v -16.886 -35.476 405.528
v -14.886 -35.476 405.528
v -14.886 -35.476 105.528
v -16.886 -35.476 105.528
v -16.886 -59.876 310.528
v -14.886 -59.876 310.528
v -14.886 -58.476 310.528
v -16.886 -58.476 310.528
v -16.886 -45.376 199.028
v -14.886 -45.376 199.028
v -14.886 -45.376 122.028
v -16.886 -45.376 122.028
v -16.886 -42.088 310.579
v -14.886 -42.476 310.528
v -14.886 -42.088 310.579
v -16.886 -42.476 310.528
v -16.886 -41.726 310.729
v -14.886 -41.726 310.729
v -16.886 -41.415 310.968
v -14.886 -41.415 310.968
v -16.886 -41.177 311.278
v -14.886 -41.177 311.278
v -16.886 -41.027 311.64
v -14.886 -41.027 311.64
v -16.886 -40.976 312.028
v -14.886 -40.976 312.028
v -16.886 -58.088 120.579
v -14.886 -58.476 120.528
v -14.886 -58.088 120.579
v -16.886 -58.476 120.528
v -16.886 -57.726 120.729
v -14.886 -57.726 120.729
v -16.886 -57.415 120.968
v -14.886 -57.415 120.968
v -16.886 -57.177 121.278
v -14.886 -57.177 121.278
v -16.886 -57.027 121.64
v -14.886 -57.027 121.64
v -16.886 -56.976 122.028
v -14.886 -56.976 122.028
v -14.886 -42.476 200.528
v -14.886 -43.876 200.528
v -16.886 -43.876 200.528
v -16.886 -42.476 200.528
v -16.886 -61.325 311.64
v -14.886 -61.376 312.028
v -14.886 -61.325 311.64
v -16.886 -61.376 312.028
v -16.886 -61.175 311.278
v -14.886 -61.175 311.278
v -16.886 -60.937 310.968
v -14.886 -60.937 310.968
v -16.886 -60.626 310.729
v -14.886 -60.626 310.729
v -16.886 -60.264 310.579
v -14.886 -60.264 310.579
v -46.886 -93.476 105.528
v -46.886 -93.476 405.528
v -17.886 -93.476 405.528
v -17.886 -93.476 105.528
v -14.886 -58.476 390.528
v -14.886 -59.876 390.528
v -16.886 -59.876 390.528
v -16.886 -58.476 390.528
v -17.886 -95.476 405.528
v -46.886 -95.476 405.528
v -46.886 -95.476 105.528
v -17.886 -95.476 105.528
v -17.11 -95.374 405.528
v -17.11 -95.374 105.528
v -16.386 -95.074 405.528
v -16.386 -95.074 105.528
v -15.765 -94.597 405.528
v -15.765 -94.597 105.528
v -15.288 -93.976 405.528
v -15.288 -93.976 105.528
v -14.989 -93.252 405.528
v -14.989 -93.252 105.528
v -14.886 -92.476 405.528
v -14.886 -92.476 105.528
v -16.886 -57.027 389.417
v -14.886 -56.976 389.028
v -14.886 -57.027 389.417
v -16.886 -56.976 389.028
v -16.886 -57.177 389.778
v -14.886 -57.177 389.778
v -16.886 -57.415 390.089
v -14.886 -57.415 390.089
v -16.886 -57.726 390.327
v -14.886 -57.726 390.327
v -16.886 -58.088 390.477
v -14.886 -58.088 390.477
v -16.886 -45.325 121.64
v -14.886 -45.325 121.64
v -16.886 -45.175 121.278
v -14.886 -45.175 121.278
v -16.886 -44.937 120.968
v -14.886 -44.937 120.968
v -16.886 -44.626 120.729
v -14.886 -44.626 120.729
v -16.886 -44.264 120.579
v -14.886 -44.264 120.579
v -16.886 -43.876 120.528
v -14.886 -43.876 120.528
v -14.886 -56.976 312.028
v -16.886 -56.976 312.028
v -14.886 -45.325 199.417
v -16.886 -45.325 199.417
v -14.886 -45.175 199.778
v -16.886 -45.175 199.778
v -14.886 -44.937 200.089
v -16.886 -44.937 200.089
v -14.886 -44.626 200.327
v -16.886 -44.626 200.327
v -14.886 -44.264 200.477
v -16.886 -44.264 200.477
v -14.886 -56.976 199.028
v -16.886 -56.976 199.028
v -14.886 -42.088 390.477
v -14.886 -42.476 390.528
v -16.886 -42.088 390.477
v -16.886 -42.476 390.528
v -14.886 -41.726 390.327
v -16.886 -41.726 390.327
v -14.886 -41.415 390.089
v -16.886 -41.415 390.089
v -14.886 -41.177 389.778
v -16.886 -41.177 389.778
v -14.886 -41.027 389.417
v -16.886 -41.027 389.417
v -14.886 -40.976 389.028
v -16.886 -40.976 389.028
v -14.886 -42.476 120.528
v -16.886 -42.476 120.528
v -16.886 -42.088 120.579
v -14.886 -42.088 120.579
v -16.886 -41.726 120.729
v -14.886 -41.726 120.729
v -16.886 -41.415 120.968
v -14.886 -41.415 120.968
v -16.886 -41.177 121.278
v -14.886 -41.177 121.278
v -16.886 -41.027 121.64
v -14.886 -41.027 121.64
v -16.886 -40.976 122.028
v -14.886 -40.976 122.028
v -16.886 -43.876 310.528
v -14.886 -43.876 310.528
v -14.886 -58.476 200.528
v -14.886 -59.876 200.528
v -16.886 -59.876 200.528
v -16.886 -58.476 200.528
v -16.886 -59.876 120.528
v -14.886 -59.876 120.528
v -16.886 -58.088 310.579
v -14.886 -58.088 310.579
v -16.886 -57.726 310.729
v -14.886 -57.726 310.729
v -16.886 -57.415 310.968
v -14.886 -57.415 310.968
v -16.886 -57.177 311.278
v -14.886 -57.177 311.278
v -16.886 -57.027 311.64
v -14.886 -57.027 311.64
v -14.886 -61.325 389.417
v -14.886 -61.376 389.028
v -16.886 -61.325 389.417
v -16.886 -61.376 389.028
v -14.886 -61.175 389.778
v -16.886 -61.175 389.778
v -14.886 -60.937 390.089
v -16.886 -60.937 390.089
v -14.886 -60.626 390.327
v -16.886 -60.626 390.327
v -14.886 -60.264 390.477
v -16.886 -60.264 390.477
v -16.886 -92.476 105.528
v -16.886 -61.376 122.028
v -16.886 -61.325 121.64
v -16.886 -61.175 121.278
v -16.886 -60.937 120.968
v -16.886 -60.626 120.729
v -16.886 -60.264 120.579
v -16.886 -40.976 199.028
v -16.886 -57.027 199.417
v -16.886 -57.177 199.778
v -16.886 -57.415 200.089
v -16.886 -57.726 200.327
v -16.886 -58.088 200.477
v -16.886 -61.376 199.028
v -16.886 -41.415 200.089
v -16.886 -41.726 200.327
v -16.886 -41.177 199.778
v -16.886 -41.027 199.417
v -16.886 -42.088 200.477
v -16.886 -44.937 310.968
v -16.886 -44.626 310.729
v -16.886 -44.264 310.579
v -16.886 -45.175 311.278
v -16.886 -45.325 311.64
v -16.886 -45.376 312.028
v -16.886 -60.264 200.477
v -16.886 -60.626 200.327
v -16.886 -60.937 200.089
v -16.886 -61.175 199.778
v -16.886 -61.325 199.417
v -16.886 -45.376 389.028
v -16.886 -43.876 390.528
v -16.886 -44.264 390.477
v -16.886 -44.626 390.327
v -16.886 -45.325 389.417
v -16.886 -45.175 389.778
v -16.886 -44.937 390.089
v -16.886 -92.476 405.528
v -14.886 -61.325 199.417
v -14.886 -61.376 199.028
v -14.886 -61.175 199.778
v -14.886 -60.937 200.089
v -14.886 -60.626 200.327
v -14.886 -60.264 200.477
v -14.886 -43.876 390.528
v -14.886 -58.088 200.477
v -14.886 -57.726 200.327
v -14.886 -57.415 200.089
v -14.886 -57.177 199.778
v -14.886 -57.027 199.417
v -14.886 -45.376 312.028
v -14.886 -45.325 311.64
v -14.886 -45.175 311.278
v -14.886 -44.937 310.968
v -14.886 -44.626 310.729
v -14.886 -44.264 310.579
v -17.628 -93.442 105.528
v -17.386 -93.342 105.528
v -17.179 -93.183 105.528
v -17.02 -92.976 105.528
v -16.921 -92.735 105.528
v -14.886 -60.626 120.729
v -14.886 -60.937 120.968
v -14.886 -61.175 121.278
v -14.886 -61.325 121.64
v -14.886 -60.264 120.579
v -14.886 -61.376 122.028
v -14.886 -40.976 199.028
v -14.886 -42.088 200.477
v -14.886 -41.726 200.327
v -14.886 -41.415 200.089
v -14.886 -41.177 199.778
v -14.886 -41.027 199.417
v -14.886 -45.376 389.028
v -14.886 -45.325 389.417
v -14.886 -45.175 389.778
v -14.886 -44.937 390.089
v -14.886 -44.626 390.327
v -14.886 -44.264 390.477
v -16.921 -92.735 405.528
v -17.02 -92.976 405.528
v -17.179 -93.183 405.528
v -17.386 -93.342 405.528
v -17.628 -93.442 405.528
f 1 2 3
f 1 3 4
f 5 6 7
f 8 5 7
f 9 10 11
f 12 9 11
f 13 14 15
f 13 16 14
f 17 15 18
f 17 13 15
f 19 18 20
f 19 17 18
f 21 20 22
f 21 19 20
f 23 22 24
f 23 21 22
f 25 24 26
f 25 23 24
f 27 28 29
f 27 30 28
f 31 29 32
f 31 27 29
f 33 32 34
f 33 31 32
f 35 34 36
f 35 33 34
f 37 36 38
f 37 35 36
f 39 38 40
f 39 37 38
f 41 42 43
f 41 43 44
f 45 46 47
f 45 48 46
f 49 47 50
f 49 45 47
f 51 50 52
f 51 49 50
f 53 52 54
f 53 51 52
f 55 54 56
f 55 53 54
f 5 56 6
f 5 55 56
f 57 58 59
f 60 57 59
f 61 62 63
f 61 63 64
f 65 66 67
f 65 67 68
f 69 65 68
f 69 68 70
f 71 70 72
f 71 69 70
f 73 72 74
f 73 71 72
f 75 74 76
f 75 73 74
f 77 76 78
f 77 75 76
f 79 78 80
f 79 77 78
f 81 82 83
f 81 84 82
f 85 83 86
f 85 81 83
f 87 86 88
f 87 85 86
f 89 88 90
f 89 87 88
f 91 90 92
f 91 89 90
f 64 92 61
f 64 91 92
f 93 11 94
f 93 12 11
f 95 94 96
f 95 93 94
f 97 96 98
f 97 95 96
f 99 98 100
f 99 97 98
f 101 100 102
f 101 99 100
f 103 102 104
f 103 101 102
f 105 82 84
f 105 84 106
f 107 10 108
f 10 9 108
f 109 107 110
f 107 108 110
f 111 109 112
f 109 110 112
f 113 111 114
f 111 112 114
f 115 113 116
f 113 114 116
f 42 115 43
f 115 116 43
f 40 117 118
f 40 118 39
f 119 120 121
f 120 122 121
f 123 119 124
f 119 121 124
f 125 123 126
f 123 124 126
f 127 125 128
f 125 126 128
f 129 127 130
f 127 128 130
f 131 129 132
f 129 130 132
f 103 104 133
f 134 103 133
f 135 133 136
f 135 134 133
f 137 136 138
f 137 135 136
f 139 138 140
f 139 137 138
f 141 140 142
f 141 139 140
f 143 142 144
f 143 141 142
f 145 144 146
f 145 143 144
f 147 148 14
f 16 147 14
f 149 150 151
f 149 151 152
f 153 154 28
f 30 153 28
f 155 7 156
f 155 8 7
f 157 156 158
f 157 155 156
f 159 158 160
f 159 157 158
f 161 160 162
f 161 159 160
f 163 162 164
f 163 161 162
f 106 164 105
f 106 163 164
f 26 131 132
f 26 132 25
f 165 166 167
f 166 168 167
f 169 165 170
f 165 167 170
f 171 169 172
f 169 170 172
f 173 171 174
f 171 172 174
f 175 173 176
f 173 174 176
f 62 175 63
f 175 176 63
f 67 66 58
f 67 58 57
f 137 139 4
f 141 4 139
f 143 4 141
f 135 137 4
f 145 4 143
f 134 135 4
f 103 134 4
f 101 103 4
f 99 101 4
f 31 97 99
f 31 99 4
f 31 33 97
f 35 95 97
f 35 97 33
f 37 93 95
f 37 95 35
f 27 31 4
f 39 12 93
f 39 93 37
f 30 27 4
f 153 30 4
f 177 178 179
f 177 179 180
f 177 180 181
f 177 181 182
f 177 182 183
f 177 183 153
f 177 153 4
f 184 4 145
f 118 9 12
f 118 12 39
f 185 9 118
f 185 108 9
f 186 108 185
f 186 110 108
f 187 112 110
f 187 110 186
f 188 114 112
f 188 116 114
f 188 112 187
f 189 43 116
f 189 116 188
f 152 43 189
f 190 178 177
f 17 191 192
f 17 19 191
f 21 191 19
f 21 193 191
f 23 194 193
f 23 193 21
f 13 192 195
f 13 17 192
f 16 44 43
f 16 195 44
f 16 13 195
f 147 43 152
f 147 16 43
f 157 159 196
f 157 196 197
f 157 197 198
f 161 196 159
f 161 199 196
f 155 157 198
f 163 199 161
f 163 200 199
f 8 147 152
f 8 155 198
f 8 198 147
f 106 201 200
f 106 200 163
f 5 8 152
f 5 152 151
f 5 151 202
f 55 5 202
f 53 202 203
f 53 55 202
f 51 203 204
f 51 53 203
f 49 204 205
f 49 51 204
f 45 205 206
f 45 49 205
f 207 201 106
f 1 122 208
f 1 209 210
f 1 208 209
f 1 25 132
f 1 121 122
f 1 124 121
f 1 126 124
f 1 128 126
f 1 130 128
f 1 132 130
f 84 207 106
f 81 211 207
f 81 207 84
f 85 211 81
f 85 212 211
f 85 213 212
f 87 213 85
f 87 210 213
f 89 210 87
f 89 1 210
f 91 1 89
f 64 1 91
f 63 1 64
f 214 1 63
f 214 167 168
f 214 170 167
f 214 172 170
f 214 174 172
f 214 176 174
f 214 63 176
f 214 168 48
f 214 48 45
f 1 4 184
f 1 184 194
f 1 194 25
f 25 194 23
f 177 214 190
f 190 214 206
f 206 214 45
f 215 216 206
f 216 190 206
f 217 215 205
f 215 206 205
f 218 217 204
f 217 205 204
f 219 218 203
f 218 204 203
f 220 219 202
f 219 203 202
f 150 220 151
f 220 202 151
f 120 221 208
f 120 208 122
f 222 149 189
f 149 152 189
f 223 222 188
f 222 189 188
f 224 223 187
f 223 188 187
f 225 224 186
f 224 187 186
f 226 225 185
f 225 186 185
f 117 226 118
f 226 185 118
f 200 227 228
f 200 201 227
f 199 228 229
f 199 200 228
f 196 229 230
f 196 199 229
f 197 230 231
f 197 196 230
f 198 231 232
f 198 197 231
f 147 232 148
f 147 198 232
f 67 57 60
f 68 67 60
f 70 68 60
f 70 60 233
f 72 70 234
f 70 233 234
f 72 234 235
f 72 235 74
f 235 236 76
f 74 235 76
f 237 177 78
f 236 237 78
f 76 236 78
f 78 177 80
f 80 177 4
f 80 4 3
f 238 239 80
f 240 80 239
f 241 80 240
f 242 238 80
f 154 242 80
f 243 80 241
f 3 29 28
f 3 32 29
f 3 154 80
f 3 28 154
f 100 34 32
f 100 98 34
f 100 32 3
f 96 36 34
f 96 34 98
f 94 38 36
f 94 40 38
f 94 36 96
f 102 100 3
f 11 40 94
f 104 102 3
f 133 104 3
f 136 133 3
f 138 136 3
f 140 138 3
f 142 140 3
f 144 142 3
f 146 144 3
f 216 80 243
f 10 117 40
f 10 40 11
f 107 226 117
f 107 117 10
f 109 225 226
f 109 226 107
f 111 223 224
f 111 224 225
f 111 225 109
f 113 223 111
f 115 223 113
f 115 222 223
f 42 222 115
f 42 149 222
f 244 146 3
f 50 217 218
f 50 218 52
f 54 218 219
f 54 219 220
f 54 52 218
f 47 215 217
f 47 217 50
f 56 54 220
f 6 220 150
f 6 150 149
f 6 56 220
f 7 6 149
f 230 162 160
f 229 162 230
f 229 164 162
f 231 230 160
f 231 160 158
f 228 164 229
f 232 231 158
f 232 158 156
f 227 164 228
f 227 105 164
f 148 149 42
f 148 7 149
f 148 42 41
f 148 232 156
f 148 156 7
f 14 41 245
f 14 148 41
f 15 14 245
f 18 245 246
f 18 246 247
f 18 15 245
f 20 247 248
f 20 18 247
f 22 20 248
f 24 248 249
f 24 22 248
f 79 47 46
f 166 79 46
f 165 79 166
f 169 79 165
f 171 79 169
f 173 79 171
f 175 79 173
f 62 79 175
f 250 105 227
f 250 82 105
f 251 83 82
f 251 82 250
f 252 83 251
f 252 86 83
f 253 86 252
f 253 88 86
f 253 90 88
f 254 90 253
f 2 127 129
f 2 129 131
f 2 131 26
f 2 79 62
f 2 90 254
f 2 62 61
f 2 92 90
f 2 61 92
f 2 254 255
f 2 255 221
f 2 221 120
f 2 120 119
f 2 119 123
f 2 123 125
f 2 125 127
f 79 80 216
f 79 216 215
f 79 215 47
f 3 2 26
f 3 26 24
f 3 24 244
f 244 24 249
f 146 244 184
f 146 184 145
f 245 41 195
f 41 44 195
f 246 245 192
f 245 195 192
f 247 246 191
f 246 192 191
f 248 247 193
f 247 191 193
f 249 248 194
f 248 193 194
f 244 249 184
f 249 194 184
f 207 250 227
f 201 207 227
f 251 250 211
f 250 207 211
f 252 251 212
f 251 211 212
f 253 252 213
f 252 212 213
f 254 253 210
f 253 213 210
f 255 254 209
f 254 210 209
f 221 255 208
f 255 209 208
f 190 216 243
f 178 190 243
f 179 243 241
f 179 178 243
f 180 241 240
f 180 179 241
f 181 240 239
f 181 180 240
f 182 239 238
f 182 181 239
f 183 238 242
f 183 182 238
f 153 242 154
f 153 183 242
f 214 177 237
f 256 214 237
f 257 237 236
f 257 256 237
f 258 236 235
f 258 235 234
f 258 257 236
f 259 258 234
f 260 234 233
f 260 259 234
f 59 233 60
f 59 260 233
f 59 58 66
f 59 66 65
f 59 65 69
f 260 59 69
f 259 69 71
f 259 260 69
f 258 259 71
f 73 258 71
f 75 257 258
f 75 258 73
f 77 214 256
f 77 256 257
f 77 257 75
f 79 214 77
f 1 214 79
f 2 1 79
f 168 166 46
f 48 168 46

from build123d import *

# Parameters (mm, degrees)
SKETCH1_W                    = 30
SKETCH1_H                    = 300
BASE_FLANGE1_DEPTH           = 2
EDGE_FLANGE1_STRIP_W         = 10
EDGE_FLANGE1_STRIP_H         = 2
EDGE_FLANGE1_STRIP_CUT_DEPTH = 300
EDGE_FLANGE1_DEPTH           = 300
CUT_EXTRUDE1_REACH           = 419.843
SKETCH8_W                    = 80
SKETCH8_H                    = 4.4
FILLET1_R                    = 1.5


# Sheet-metal steps are written as plain solids
with BuildPart() as part:
    # Sketch1 → Base-Flange1 (new body)
    with BuildSketch(Plane(origin=(0, -95.475928118, 0), x_dir=(1, 0, 0), z_dir=(0, 1, 0))):
        with Locations((-31.886491489, -255.528293106)):
            Rectangle(SKETCH1_W, SKETCH1_H)
    extrude(amount=BASE_FLANGE1_DEPTH)

    # Edge-Flange1 strip (across the edge) → Edge-Flange1 strip cut (cut)
    with BuildSketch(Plane(origin=(-16.886491489, -93.475928118, 405.528293106), x_dir=(-1, 0, 0), z_dir=(0, 0, -1))):
        with Locations((-4, -1)):
            Rectangle(EDGE_FLANGE1_STRIP_W, EDGE_FLANGE1_STRIP_H)
    extrude(amount=EDGE_FLANGE1_STRIP_CUT_DEPTH, mode=Mode.SUBTRACT)

    # Edge-Flange1 section (across the edge) → Edge-Flange1 (add)
    with BuildSketch(Plane(origin=(-16.886491489, -93.475928118, 405.528293106), x_dir=(-1, 0, 0), z_dir=(0, 0, -1))):
        with BuildLine():
            Line((-2, 1), (-2, 58))
            Line((-2, 58), (0, 58))
            Line((0, 58), (0, 1))
            ThreePointArc((0, 1), (0.292893219, 0.292893219), (1, 0))
            Line((1, 0), (1, -2))
            ThreePointArc((1, -2), (-1.121320344, -1.121320344), (-2, 1))
        make_face()
    extrude(amount=EDGE_FLANGE1_DEPTH)

    # Sketch8 → Cut-Extrude1 (cut, up to next)
    with BuildSketch(Plane(origin=(-14.886491489, 0, 0), x_dir=(0, 0, -1), z_dir=(1, 0, 0)), mode=Mode.PRIVATE) as cut_extrude1_sk1:
        with Locations((-160.528293106, -43.175928118)):
            Rectangle(SKETCH8_W, SKETCH8_H)
    cut_extrude1_tool1 = extrude(cut_extrude1_sk1.sketch, amount=-CUT_EXTRUDE1_REACH, mode=Mode.PRIVATE) & part.part
    # Sketch8 → Cut-Extrude1 (cut, up to next)
    with BuildSketch(Plane(origin=(-14.886491489, 0, 0), x_dir=(0, 0, -1), z_dir=(1, 0, 0)), mode=Mode.PRIVATE) as cut_extrude1_sk2:
        with Locations((-160.528293106, -59.175928118)):
            Rectangle(SKETCH8_W, SKETCH8_H)
    cut_extrude1_tool2 = extrude(cut_extrude1_sk2.sketch, amount=-CUT_EXTRUDE1_REACH, mode=Mode.PRIVATE) & part.part
    # Sketch8 → Cut-Extrude1 (cut, up to next)
    with BuildSketch(Plane(origin=(-14.886491489, 0, 0), x_dir=(0, 0, -1), z_dir=(1, 0, 0)), mode=Mode.PRIVATE) as cut_extrude1_sk3:
        with Locations((-350.528293106, -43.175928118)):
            Rectangle(SKETCH8_W, SKETCH8_H)
    cut_extrude1_tool3 = extrude(cut_extrude1_sk3.sketch, amount=-CUT_EXTRUDE1_REACH, mode=Mode.PRIVATE) & part.part
    # Sketch8 → Cut-Extrude1 (cut, up to next)
    with BuildSketch(Plane(origin=(-14.886491489, 0, 0), x_dir=(0, 0, -1), z_dir=(1, 0, 0)), mode=Mode.PRIVATE) as cut_extrude1_sk4:
        with Locations((-350.528293106, -59.175928118)):
            Rectangle(SKETCH8_W, SKETCH8_H)
    cut_extrude1_tool4 = extrude(cut_extrude1_sk4.sketch, amount=-CUT_EXTRUDE1_REACH, mode=Mode.PRIVATE) & part.part
    add(cut_extrude1_tool1.solids().sort_by_distance((-14.886491, -43.175928, 160.528293))[0], mode=Mode.SUBTRACT)
    add(cut_extrude1_tool2.solids().sort_by_distance((-14.886491, -59.175928, 160.528293))[0], mode=Mode.SUBTRACT)
    add(cut_extrude1_tool3.solids().sort_by_distance((-14.886491, -43.175928, 350.528293))[0], mode=Mode.SUBTRACT)
    add(cut_extrude1_tool4.solids().sort_by_distance((-14.886491, -59.175928, 350.528293))[0], mode=Mode.SUBTRACT)

    # Fillet1
    fillet1_edges = [part.edges().sort_by_distance(p)[0] for p in [
        (-15.886491489, -40.975928118, 120.528293106),
        (-15.886491489, -45.375928118, 120.528293106),
        (-15.886491489, -45.375928118, 200.528293106),
        (-15.886491489, -40.975928118, 200.528293106),
        (-15.886491489, -56.975928118, 120.528293106),
        (-15.886491489, -61.375928118, 120.528293106),
        (-15.886491489, -61.375928118, 200.528293106),
        (-15.886491489, -56.975928118, 200.528293106),
        (-15.886491489, -45.375928118, 390.528293106),
        (-15.886491489, -40.975928118, 390.528293106),
        (-15.886491489, -40.975928118, 310.528293106),
        (-15.886491489, -45.375928118, 310.528293106),
        (-15.886491489, -61.375928118, 390.528293106),
        (-15.886491489, -56.975928118, 390.528293106),
        (-15.886491489, -56.975928118, 310.528293106),
        (-15.886491489, -61.375928118, 310.528293106),
    ]]
    fillet(fillet1_edges, radius=FILLET1_R)


solid = part.part
